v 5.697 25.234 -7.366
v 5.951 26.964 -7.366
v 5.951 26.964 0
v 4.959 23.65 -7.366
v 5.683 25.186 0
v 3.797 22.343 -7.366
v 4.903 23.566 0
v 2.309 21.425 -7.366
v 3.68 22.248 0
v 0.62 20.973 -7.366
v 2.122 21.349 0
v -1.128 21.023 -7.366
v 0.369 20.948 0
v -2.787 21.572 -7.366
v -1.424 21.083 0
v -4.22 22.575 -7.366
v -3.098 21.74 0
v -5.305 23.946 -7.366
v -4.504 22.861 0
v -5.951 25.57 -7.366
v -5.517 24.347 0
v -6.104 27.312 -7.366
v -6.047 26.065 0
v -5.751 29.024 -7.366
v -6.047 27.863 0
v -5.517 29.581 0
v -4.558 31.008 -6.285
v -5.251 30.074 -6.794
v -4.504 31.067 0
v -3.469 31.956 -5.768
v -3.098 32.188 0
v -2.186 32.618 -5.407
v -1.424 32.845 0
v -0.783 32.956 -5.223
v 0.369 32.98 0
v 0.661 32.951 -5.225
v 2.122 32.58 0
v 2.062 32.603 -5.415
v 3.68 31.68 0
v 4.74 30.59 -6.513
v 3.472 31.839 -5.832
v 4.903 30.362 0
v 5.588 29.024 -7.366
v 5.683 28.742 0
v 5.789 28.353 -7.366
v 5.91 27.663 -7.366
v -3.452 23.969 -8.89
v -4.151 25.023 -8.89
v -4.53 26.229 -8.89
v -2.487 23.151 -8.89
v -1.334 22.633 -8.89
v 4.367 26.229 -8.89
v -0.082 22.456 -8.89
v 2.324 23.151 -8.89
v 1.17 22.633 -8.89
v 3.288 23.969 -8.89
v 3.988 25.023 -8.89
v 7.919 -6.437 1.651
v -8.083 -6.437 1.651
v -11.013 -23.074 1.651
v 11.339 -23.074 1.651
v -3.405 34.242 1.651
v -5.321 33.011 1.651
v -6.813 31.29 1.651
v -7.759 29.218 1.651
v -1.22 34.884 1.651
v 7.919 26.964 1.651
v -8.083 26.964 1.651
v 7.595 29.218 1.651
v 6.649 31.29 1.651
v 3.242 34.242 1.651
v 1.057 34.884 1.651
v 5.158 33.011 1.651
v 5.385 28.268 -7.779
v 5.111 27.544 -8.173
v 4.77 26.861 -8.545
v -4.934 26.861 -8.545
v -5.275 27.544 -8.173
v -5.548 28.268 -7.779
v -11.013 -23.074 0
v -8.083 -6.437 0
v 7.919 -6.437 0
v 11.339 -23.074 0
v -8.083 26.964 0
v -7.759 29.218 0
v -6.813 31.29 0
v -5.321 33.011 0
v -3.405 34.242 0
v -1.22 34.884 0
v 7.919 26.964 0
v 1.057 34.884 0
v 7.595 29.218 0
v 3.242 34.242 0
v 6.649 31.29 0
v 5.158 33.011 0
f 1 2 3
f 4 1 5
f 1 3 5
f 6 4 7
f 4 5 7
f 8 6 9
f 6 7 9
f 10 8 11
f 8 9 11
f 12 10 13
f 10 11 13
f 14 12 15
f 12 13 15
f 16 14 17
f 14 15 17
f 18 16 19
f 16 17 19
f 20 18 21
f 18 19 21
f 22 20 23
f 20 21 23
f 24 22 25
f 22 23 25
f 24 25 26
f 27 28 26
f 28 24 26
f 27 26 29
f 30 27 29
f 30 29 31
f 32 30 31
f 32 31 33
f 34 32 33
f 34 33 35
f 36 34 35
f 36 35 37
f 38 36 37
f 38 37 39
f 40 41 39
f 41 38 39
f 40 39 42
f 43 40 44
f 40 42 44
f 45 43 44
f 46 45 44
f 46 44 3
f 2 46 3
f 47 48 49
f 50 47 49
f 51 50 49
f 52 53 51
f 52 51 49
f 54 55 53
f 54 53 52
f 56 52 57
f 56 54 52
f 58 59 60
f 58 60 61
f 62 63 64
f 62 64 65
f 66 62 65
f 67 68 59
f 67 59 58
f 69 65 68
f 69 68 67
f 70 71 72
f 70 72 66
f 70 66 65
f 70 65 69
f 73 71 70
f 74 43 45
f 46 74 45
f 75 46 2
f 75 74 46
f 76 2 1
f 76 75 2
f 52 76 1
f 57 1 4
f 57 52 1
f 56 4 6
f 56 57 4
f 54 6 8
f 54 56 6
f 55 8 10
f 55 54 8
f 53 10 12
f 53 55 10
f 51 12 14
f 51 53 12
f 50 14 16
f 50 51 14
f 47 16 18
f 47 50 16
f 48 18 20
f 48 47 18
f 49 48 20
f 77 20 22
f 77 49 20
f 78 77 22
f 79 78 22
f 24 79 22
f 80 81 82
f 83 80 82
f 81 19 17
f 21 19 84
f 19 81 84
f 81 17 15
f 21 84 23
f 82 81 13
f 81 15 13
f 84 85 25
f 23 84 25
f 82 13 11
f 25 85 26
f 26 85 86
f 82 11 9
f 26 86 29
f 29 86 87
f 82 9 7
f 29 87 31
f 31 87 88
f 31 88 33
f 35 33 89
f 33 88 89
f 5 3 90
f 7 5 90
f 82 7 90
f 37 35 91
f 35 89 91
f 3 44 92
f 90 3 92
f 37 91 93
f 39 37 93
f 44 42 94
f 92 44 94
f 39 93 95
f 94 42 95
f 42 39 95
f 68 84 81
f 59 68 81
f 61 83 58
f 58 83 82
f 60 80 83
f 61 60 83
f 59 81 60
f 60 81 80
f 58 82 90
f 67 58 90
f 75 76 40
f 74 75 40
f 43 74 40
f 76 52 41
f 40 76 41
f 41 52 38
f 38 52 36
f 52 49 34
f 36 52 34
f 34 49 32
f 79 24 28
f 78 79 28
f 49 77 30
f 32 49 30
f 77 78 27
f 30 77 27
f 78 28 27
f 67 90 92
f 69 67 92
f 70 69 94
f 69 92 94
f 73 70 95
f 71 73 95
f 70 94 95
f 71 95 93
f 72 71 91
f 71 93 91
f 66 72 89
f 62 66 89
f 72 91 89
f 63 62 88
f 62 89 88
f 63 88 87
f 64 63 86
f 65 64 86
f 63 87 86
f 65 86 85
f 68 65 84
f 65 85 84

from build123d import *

# Parameters (mm, degrees)
F1_DEPTH    = 1.651
F2_R        = 6.0325
F3_DEPTH    = 8.89
F5_DEPTH    = 17.3228
F6_T2_ANGLE = 240.5568781665


# Not quite as in the source:
# - a fillet or chamfer that OpenCascade refuses, or shapes differently, is made with other operations: its cross-section is extruded or revolved along the edge and cut away or added


with BuildPart() as f1:
    # F0 (on Top) → F1 (new body)
    with BuildSketch(Plane.XY):
        with BuildLine():
            Line((-8.0826530047, 26.9640675335), (-8.0826530047, -6.4369324665))
            Line((-8.0826530047, -6.4369324665), (-11.0126939906, -23.0739324665))
            Line((-11.0126939906, -23.0739324665), (11.3393060094, -23.0739324665))
            Line((11.3393060094, -23.0739324665), (7.9193469953, -6.4369324665))
            Line((7.9193469953, -6.4369324665), (7.9193469953, 26.9640675335))
            ThreePointArc((7.9193469953, 26.9640675335), (-0.0816530047, 34.9650675335), (-8.0826530047, 26.9640675335))
        make_face()
    extrude(amount=F1_DEPTH)

    # F2 (on face) → F3 (join)
    with BuildSketch(Plane(origin=(0, 0, 0), x_dir=(1, 0, 0), z_dir=(0, 0, -1))):
        with Locations((-0.0816530047, -26.9640675335)):
            Circle(F2_R)
    extrude(amount=F3_DEPTH)

    # F4 (on face) → F5 (cut)
    with BuildSketch(Plane(origin=(-8.0826530047, 0, 0), x_dir=(0, -1, 0), z_dir=(-1, 0, 0))):
        Polygon((-24.261539802, -9.96281486), (-34.2662967741, -4.5080343261), (-34.2662967741, -10.2679394186), align=None)
    extrude(amount=-F5_DEPTH, mode=Mode.SUBTRACT)

    # F6: chamfer of 1.524 on 1 edges, made by hand

    # F6_s1 → F6_t2 (revolve, cut)
    with BuildSketch(Plane(origin=(-11.7615074362, 20.1448064433, 0), x_dir=(0, 0, 1), z_dir=(-0.5042026846, 0.8635853477, 0))):
        Polygon((-7.366, 19.5573408996), (-8.89, 18.0333408996), (-8.89, 19.5573408996), align=None)
    revolve(axis=Axis((-0.0816530047, 26.9640675335, -8.89), (0, 0, -1)), revolution_arc=F6_T2_ANGLE, mode=Mode.SUBTRACT)


solid = f1.part
